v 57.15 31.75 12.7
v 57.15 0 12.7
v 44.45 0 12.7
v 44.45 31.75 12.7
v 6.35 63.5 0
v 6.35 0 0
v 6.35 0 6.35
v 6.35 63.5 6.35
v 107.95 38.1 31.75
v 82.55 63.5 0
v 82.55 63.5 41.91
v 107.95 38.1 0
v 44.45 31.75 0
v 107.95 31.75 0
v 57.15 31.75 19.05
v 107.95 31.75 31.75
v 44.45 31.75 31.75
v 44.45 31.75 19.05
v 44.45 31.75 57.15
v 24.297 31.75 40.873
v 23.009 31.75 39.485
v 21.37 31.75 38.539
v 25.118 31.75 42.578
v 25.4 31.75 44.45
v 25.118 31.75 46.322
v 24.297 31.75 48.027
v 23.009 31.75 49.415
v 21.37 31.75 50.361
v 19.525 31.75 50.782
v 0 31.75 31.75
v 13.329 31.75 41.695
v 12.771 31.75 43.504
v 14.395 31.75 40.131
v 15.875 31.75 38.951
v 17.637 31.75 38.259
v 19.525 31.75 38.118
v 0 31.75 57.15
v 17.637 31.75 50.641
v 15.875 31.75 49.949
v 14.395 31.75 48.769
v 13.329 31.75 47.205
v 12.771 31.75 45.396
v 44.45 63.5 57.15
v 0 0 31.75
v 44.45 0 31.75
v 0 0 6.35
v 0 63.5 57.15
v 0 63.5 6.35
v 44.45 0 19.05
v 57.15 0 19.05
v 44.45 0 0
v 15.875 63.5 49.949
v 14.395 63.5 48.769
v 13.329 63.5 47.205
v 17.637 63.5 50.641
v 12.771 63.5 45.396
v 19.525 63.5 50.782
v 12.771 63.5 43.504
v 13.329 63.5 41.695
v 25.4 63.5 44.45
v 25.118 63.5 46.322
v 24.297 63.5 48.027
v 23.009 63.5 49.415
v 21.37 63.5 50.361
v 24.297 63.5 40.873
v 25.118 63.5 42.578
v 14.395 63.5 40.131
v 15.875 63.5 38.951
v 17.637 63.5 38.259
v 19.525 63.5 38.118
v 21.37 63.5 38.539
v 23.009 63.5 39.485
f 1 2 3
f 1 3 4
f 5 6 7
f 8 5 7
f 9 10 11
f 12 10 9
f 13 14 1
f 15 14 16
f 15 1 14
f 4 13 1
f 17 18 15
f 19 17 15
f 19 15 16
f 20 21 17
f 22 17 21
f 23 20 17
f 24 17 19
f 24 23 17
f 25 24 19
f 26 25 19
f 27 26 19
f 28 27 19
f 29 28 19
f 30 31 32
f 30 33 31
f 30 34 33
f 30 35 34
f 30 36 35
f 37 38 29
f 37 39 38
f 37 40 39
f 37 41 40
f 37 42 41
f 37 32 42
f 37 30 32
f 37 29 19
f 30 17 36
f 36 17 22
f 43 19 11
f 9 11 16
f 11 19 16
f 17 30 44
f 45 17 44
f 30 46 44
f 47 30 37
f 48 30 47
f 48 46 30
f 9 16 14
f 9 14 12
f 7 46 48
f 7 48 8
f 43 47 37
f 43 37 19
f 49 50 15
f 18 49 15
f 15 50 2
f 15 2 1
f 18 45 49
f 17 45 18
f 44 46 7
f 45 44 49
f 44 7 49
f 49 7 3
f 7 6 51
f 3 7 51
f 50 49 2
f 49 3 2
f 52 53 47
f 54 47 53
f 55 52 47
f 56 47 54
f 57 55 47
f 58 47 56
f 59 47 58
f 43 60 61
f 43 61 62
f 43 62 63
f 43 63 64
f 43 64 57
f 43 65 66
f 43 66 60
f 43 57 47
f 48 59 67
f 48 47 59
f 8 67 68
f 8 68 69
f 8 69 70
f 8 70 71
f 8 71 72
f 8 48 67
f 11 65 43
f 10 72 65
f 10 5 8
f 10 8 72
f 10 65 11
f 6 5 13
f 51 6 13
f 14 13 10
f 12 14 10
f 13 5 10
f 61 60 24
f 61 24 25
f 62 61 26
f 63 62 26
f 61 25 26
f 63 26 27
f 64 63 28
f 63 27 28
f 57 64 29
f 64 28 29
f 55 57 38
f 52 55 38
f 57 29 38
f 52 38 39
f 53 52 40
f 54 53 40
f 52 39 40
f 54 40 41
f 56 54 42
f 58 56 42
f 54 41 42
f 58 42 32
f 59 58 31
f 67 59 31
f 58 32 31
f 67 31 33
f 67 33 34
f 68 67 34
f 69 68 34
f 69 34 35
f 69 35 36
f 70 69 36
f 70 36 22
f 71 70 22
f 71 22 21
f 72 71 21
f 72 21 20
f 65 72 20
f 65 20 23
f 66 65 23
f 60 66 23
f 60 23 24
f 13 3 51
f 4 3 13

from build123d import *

# Parameters (mm, degrees)
F0_W      = 107.95
F0_H      = 63.5
F1_DEPTH  = 57.15
F2_W      = 31.75
F2_H      = 25.4
F3_DEPTH  = 107.951
F4_W      = 31.75
F4_H      = 12.7
F5_DEPTH  = 63.5
F6_W      = 50.8
F6_H      = 31.75
F7_DEPTH  = 25.4
F8_R      = 6.35
F9_DEPTH  = 31.751
F10_W     = 6.35
F10_H     = 6.35
F11_DEPTH = 63.501
F13_DEPTH = 31.751
F15_DEPTH = 57.151


with BuildPart() as f1:
    # F0 (on Top) → F1 (new body)
    with BuildSketch(Plane.XY):
        with Locations((53.975, 31.75)):
            Rectangle(F0_W, F0_H)
    extrude(amount=F1_DEPTH)

    # F2 (on face) → F3 (cut, through all)
    with BuildSketch(Plane(origin=(0, 0, 0), x_dir=(0, -1, 0), z_dir=(-1, 0, 0))):
        with Locations((-15.875, 44.45)):
            Rectangle(F2_W, F2_H)
    extrude(amount=-F3_DEPTH, mode=Mode.SUBTRACT)

    # F4 (on face) → F5 (cut)
    with BuildSketch(Plane.YZ.offset(107.95)):
        with Locations((15.875, 25.4)):
            Rectangle(F4_W, F4_H)
        with Locations((15.875, 6.35)):
            Rectangle(F4_W, F4_H)
    extrude(amount=-F5_DEPTH, mode=Mode.SUBTRACT)

    # F6 (on face) → F7 (cut)
    with BuildSketch(Plane.XY.offset(19.05)):
        with Locations((82.55, 15.875)):
            Rectangle(F6_W, F6_H)
    extrude(amount=-F7_DEPTH, mode=Mode.SUBTRACT)

    # F8 (on face) → F9 (cut, through all)
    with BuildSketch(Plane.XZ.offset(-31.75)):
        with Locations((19.05, 44.45)):
            Circle(F8_R)
    extrude(amount=-F9_DEPTH, mode=Mode.SUBTRACT)

    # F10 (on face) → F11 (cut, through all)
    with BuildSketch(Plane.XZ):
        with Locations((3.175, 3.175)):
            Rectangle(F10_W, F10_H)
    extrude(amount=-F11_DEPTH, mode=Mode.SUBTRACT)

    # F12 (on face) → F13 (cut, through all)
    with BuildSketch(Plane.XZ.offset(-31.75)):
        Polygon((107.95, 57.15), (44.45, 57.15), (107.95, 31.75), align=None)
    extrude(amount=-F13_DEPTH, mode=Mode.SUBTRACT)

    # F14 (on face) → F15 (cut, through all)
    with BuildSketch(Plane.XY):
        Polygon((82.55, 63.5), (107.95, 38.1), (107.95, 63.5), align=None)
    extrude(amount=F15_DEPTH, mode=Mode.SUBTRACT)


solid = f1.part
